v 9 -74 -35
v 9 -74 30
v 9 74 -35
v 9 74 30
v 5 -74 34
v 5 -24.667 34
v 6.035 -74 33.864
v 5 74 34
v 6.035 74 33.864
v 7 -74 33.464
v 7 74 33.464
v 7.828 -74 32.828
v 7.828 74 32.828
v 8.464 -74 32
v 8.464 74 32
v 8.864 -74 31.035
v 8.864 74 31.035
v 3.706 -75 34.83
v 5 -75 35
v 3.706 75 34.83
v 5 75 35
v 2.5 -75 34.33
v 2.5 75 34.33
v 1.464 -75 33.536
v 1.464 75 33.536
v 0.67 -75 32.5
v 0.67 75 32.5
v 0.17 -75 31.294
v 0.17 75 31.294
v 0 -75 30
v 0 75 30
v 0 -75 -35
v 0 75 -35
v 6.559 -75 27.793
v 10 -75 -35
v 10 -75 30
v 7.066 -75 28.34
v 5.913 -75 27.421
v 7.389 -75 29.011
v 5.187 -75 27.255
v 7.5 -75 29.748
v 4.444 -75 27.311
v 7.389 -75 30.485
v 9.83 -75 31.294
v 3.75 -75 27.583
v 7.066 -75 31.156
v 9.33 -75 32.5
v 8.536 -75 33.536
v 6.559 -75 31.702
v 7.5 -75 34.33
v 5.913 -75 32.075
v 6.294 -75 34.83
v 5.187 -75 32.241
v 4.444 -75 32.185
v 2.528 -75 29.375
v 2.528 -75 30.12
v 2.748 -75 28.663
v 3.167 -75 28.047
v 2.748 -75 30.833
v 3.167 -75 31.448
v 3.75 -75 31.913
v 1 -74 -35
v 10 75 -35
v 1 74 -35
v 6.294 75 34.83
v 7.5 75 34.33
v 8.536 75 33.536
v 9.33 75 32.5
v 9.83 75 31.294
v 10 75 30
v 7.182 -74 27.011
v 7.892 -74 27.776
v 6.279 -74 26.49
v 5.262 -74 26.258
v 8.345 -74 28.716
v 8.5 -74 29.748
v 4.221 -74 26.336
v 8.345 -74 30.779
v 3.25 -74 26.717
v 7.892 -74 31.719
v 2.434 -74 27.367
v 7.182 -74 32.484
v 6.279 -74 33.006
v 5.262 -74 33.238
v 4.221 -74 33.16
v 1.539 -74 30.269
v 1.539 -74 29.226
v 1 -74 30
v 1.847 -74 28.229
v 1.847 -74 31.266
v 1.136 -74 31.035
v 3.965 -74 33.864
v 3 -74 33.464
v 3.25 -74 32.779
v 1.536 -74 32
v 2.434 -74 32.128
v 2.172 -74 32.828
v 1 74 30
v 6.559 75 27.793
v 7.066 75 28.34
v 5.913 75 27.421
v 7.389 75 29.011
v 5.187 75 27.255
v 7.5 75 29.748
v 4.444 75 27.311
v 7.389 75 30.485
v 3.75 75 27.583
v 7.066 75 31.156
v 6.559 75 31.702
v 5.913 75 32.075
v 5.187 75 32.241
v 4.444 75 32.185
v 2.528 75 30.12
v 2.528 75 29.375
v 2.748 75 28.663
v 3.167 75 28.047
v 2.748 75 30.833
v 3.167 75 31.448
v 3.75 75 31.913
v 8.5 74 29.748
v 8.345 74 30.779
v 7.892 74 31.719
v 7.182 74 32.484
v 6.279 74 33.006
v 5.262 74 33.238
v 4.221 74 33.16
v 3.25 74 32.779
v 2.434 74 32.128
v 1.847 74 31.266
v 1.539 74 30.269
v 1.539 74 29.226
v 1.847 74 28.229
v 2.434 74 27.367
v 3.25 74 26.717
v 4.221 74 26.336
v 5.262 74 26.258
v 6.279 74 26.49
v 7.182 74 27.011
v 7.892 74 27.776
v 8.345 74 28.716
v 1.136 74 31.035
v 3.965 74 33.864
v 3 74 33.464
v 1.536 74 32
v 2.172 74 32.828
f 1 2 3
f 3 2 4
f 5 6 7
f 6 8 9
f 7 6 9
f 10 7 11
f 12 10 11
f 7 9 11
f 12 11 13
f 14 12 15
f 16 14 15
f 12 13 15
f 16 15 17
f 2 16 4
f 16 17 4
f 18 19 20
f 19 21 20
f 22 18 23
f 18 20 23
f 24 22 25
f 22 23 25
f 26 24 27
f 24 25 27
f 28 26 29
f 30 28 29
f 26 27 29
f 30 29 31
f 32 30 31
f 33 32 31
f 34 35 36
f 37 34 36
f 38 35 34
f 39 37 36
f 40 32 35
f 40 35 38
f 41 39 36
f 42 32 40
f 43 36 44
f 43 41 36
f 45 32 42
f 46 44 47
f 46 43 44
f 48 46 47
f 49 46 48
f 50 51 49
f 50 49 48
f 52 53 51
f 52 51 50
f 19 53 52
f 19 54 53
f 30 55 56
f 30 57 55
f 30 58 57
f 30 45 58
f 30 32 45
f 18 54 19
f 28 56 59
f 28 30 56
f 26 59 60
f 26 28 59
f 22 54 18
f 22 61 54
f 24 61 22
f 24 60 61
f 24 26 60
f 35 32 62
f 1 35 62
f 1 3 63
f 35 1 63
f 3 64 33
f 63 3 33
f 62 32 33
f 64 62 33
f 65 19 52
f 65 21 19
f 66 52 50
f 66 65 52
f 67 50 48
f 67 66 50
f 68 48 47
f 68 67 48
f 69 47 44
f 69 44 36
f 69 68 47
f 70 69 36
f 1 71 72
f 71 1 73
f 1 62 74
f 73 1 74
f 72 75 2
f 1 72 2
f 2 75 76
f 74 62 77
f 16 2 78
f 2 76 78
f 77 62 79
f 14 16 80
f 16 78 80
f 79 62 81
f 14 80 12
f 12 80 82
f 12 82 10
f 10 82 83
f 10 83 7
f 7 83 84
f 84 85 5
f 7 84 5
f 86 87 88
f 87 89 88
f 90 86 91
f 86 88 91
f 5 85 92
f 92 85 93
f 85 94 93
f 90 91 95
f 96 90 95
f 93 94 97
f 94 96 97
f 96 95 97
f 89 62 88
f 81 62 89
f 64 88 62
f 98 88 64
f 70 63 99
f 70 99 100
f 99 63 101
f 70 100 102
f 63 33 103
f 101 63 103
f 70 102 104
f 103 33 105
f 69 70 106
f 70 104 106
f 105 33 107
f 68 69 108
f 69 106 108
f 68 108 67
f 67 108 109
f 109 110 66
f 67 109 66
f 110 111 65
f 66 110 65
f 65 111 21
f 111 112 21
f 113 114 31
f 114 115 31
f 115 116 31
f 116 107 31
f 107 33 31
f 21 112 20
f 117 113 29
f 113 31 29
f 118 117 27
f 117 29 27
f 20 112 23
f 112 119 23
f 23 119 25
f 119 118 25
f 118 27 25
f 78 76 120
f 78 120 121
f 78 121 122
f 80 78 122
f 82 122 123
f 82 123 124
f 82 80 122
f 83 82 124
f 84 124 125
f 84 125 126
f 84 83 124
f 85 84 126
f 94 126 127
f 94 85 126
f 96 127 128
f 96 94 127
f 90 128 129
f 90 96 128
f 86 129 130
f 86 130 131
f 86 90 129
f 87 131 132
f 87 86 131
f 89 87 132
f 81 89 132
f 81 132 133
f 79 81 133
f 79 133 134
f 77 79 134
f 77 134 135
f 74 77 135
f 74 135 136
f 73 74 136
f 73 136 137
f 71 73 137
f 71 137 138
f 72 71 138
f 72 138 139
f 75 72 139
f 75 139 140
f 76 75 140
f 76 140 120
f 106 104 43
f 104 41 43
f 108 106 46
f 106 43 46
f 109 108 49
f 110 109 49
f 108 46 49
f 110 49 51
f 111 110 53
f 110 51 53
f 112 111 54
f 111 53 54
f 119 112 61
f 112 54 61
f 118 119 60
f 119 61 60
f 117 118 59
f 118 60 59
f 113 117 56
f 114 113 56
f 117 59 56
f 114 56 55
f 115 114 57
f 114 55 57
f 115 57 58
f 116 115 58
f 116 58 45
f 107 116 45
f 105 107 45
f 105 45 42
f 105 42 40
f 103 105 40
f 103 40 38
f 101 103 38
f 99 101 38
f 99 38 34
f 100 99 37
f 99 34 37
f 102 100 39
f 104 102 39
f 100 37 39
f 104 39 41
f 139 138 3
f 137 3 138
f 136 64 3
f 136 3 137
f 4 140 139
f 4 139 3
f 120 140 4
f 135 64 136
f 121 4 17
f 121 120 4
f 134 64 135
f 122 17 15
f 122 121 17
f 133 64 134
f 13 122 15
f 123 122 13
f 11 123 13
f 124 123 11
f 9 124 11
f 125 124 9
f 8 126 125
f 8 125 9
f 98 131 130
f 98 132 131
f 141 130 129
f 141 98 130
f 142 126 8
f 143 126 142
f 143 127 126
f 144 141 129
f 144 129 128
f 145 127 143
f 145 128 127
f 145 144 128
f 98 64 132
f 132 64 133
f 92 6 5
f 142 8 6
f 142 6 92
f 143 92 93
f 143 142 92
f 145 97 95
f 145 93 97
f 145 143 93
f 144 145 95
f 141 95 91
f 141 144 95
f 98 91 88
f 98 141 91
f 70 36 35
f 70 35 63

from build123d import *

# Parameters (mm, degrees)
F0_W     = 150
F0_H     = 70
F1_DEPTH = 10
F2_R     = 4.99999
F3_R     = 2.5
F4_DEPTH = 80.75
F5_T     = -1


# Not quite as in the source:
# - a fillet or chamfer is up to 0.001 mm smaller than in the source, because OpenCascade refuses the exact size


with BuildPart() as f1:
    # F0 (on Right) → F1 (new body)
    with BuildSketch(Plane.YZ):
        Rectangle(F0_W, F0_H)
    extrude(amount=F1_DEPTH)

    # F2 (radius 5 in the source; OpenCascade refuses exactly that, so slightly less here)
    f2_edges = [f1.edges().sort_by_distance(p)[0] for p in [
        (10, 0, 35),
        (0, 0, 35),
    ]]
    fillet(f2_edges, radius=F2_R)

    # F3 (on Front) → F4 (cut, symmetric)
    with BuildSketch(Plane.XZ):
        with Locations((5, 29.747851193)):
            Circle(F3_R)
    extrude(amount=F4_DEPTH, both=True, mode=Mode.SUBTRACT)

    # F5
    f5_openings = [f1.faces().sort_by_distance(p)[0] for p in [
        (5, 0, -35),
    ]]
    offset(amount=F5_T, openings=f5_openings)


solid = f1.part
